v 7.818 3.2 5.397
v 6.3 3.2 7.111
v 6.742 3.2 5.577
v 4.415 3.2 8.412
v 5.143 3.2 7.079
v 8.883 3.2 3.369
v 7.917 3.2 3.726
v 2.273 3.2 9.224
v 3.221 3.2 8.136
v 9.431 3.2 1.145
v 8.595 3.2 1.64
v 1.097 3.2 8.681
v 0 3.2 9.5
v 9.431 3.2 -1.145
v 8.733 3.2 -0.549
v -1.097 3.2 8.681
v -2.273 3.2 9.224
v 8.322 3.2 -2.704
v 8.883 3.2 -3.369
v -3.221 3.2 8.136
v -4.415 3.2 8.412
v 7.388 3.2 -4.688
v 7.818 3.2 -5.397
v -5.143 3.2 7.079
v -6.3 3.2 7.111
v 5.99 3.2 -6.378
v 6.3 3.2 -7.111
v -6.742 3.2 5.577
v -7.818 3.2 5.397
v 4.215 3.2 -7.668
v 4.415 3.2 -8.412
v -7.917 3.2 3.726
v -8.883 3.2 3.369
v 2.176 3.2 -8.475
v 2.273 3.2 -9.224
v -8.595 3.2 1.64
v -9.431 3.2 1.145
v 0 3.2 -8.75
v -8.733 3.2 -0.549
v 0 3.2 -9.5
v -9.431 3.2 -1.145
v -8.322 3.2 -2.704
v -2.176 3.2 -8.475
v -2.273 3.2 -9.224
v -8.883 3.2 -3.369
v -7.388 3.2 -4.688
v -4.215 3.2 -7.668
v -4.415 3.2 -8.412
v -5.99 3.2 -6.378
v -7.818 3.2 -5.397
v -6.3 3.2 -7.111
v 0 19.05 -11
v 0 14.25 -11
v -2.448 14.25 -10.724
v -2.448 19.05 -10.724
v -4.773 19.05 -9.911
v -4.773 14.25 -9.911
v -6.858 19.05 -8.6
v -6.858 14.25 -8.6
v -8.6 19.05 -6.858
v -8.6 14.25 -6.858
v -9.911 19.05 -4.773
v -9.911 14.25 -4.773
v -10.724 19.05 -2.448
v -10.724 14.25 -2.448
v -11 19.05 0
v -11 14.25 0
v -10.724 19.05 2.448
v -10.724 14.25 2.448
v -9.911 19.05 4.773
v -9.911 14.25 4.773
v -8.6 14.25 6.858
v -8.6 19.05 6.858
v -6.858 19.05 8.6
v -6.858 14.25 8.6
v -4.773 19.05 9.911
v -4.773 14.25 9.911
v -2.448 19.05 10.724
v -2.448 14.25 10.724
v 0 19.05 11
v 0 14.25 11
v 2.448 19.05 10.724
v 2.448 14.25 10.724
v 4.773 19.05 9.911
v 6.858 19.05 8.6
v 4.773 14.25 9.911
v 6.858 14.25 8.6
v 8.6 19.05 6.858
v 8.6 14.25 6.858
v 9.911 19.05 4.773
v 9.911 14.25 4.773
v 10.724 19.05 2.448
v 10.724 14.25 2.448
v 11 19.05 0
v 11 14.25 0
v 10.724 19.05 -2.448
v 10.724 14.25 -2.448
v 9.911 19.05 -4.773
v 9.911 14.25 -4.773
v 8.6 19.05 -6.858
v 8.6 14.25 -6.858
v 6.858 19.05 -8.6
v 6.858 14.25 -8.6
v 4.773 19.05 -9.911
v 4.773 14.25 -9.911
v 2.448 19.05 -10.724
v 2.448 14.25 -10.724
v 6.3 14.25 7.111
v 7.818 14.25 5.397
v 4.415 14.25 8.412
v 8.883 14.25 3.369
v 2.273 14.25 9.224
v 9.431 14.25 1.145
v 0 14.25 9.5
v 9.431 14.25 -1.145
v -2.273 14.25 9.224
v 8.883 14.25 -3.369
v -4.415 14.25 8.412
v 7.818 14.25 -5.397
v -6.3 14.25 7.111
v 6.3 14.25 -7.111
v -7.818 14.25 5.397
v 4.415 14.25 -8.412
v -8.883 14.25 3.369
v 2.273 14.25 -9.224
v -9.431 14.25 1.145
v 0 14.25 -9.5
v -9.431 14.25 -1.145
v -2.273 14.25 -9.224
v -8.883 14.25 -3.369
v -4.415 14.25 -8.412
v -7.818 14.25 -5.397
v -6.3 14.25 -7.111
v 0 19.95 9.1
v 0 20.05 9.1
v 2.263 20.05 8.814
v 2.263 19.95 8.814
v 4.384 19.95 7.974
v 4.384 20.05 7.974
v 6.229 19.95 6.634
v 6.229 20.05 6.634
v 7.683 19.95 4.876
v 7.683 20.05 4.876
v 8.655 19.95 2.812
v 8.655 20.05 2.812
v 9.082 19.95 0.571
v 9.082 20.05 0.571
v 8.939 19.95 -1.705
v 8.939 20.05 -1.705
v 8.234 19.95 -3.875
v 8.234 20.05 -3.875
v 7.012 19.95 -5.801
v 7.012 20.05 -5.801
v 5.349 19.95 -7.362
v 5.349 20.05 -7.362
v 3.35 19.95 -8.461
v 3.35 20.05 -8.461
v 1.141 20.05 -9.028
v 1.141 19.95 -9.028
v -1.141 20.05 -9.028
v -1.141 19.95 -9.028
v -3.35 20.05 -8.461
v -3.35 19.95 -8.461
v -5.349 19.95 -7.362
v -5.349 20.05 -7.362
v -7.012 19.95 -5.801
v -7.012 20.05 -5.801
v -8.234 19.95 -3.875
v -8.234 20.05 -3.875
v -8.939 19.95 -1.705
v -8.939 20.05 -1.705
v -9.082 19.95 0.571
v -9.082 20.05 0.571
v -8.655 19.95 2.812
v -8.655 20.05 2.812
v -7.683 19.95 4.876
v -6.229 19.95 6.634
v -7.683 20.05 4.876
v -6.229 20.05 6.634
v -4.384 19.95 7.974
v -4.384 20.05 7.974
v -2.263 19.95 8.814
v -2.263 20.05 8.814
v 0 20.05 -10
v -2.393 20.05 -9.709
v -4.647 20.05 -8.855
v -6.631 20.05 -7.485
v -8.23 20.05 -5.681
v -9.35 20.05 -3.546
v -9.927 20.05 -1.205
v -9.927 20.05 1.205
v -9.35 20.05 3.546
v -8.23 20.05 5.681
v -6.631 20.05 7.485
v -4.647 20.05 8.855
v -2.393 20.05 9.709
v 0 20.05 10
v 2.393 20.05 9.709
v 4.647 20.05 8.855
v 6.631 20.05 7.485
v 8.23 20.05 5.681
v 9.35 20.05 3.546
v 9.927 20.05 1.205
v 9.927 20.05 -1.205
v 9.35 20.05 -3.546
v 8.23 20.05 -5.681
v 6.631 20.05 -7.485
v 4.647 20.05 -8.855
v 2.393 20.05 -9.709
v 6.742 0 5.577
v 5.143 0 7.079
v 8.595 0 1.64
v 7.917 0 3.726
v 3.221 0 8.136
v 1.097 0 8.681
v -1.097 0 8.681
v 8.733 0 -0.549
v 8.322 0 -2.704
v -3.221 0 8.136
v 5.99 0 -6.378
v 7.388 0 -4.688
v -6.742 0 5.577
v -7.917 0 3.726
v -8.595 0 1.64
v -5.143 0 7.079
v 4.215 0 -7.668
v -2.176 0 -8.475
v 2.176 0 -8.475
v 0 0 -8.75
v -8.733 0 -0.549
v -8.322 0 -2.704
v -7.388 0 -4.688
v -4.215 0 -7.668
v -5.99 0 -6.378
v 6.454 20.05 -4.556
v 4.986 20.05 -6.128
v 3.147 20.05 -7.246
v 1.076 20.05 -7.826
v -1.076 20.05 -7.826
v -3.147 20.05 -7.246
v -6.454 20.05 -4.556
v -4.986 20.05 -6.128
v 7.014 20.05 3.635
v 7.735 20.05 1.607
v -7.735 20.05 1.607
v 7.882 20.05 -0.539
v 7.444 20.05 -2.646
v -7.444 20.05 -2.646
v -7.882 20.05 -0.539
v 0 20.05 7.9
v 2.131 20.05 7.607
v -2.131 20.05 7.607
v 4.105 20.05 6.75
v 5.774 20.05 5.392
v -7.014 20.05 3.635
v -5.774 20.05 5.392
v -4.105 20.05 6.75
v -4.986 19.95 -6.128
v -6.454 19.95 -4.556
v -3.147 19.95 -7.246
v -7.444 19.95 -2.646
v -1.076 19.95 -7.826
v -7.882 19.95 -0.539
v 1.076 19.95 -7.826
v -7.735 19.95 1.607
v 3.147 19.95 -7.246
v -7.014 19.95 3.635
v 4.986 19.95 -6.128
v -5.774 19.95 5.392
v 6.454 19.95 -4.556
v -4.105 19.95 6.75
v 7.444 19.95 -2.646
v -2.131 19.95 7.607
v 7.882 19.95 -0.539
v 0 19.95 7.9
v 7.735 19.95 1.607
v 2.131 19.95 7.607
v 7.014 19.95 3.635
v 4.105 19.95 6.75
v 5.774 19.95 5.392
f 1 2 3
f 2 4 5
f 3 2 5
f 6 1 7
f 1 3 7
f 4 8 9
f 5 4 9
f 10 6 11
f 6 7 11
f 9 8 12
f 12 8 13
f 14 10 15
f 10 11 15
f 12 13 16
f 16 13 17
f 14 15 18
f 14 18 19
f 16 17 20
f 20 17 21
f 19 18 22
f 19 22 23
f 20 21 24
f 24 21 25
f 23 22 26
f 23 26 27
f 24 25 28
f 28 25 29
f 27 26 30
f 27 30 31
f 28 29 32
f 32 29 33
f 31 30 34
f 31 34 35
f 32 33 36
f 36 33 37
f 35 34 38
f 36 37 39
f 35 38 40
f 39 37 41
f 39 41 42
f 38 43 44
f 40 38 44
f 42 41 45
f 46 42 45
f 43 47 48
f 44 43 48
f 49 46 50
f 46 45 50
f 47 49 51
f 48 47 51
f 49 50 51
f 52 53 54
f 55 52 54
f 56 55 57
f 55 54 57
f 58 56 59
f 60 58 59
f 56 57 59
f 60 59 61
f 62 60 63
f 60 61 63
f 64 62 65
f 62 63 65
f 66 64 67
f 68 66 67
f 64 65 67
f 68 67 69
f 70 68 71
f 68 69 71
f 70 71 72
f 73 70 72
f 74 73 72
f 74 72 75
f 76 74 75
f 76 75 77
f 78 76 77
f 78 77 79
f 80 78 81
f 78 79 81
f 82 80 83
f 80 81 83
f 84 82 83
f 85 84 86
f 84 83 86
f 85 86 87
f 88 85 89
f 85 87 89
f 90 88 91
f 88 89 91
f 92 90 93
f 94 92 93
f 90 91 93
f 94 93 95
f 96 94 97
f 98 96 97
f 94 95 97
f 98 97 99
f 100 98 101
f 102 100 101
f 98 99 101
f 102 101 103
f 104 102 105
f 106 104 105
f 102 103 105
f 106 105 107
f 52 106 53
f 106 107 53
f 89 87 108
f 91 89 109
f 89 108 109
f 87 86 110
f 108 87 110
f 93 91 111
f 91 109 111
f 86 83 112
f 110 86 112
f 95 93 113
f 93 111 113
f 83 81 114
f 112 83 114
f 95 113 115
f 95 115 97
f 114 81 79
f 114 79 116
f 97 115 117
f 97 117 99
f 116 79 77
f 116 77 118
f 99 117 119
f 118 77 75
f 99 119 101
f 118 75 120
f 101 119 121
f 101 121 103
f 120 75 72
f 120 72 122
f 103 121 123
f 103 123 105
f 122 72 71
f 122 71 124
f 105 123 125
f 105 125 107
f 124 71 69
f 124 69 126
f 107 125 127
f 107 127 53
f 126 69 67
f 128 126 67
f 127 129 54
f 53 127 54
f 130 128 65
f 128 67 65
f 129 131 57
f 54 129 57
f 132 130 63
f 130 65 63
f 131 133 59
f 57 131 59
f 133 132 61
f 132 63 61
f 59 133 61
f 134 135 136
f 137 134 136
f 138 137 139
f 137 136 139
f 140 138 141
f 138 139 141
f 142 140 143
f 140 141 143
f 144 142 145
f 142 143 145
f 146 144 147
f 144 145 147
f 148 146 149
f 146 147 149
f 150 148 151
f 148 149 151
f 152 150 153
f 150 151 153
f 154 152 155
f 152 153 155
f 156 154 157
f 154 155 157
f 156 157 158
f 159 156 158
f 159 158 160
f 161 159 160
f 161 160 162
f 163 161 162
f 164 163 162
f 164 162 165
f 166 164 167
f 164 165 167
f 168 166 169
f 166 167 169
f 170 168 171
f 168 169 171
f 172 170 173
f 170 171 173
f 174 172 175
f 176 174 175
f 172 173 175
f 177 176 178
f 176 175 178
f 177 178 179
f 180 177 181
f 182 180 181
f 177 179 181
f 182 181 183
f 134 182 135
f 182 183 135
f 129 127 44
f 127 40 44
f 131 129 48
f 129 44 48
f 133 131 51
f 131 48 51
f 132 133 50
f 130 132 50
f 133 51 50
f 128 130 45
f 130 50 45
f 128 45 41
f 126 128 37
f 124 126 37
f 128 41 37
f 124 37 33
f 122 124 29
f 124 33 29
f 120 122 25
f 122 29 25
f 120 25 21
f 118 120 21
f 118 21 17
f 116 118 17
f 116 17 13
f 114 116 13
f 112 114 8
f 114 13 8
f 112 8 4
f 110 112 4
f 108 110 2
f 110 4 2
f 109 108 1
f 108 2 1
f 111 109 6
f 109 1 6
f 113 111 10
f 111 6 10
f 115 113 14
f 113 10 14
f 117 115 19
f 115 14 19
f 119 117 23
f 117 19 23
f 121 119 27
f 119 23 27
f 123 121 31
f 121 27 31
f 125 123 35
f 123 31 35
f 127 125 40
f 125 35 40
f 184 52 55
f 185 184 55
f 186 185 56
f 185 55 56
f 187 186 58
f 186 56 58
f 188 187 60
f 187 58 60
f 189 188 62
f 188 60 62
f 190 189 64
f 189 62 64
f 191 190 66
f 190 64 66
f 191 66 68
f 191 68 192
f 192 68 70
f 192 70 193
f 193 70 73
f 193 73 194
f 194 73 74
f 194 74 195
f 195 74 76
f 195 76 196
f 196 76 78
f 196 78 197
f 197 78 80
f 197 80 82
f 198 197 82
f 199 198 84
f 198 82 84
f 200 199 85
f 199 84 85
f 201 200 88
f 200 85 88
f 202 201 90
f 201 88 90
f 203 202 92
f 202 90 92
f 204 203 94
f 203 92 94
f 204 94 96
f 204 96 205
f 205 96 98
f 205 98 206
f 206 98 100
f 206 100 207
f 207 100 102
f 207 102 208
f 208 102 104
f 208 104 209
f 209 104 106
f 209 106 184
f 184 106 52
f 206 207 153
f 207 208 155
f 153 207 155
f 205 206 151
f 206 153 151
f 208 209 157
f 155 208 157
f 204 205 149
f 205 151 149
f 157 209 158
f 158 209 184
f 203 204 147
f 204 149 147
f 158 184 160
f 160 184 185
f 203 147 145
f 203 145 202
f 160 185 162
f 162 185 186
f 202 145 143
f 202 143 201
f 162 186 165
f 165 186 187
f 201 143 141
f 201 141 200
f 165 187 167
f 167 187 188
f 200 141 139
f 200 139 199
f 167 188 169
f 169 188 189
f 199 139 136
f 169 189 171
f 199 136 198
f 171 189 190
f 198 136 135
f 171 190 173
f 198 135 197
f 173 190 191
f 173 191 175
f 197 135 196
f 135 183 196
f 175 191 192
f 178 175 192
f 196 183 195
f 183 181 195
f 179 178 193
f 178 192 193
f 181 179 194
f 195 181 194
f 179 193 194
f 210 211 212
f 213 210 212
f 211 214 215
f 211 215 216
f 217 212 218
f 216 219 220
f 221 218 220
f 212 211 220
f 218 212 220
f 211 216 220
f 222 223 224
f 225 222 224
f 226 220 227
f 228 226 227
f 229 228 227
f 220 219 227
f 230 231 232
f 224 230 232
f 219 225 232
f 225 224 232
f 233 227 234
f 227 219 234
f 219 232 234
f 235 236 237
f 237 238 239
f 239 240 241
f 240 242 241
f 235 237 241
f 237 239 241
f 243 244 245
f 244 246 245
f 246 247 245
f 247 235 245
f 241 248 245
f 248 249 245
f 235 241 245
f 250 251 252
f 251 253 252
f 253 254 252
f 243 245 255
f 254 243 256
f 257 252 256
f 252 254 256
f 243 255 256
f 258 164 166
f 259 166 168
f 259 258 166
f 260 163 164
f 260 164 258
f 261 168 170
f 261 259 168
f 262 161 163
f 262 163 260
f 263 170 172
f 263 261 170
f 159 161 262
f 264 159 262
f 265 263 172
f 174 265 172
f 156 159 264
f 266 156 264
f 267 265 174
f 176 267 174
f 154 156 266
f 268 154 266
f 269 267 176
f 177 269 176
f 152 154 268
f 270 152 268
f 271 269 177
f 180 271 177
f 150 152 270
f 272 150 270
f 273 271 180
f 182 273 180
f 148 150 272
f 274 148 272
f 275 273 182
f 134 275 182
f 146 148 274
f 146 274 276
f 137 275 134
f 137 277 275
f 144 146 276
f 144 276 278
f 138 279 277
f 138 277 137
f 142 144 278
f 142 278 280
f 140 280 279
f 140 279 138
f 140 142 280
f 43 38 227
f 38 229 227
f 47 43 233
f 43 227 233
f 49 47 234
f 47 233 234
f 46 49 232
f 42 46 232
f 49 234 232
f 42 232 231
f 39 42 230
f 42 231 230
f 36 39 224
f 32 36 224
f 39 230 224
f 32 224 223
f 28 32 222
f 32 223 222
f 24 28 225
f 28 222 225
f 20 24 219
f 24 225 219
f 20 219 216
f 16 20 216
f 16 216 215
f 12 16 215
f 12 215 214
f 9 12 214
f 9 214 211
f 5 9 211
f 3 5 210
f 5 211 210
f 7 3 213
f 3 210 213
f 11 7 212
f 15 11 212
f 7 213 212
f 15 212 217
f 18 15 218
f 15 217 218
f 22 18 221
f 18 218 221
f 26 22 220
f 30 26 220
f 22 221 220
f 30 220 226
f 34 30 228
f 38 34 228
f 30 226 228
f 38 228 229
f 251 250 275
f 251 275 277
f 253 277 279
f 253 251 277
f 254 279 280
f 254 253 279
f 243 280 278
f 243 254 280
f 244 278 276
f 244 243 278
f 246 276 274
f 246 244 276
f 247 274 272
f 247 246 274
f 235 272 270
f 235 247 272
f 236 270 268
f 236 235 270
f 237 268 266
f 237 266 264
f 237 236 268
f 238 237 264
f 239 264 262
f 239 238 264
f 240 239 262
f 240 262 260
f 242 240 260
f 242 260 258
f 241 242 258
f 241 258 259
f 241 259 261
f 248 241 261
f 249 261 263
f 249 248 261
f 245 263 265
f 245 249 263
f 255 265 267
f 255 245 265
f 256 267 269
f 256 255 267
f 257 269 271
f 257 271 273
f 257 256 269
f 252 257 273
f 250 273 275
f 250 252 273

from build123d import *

# Parameters (mm, degrees)
SKETCH2_R          = 9.1
SKETCH2_R_2        = 7.9
CUT_EXTRUDE1_DEPTH = 0.1
CHAMFER1_SIZE      = 1


with BuildPart() as part:
    # Sketch1 → Revolve1 (revolve)
    with BuildSketch(Plane(origin=(0, 0, 0), x_dir=(0, 0, -1), z_dir=(1, 0, 0))):
        Polygon((0, 20.05), (11, 20.05), (11, 14.25), (9.5, 14.25), (9.5, 3.2), (8.75, 3.2), (8.75, 0), (0, 0), align=None)
    revolve(axis=Axis((0, 0, 0), (0, 1, 0)))

    # Sketch2 → Cut-Extrude1 (cut)
    with BuildSketch(Plane(origin=(0, 20.05, 0), x_dir=(1, 0, 0), z_dir=(0, 1, 0))):
        with Locations(Location((0, 0, 0), (0, 0, 270))):
            Circle(SKETCH2_R)
        with Locations(Location((0, 0, 0), (0, 0, 270))):
            Circle(SKETCH2_R_2, mode=Mode.SUBTRACT)
    extrude(amount=-CUT_EXTRUDE1_DEPTH, mode=Mode.SUBTRACT)

    # Chamfer1
    chamfer1_edges = [part.edges().sort_by_distance(p)[0] for p in [
        (0, 20.05, 11),
    ]]
    chamfer(chamfer1_edges, length=CHAMFER1_SIZE)


solid = part.part
